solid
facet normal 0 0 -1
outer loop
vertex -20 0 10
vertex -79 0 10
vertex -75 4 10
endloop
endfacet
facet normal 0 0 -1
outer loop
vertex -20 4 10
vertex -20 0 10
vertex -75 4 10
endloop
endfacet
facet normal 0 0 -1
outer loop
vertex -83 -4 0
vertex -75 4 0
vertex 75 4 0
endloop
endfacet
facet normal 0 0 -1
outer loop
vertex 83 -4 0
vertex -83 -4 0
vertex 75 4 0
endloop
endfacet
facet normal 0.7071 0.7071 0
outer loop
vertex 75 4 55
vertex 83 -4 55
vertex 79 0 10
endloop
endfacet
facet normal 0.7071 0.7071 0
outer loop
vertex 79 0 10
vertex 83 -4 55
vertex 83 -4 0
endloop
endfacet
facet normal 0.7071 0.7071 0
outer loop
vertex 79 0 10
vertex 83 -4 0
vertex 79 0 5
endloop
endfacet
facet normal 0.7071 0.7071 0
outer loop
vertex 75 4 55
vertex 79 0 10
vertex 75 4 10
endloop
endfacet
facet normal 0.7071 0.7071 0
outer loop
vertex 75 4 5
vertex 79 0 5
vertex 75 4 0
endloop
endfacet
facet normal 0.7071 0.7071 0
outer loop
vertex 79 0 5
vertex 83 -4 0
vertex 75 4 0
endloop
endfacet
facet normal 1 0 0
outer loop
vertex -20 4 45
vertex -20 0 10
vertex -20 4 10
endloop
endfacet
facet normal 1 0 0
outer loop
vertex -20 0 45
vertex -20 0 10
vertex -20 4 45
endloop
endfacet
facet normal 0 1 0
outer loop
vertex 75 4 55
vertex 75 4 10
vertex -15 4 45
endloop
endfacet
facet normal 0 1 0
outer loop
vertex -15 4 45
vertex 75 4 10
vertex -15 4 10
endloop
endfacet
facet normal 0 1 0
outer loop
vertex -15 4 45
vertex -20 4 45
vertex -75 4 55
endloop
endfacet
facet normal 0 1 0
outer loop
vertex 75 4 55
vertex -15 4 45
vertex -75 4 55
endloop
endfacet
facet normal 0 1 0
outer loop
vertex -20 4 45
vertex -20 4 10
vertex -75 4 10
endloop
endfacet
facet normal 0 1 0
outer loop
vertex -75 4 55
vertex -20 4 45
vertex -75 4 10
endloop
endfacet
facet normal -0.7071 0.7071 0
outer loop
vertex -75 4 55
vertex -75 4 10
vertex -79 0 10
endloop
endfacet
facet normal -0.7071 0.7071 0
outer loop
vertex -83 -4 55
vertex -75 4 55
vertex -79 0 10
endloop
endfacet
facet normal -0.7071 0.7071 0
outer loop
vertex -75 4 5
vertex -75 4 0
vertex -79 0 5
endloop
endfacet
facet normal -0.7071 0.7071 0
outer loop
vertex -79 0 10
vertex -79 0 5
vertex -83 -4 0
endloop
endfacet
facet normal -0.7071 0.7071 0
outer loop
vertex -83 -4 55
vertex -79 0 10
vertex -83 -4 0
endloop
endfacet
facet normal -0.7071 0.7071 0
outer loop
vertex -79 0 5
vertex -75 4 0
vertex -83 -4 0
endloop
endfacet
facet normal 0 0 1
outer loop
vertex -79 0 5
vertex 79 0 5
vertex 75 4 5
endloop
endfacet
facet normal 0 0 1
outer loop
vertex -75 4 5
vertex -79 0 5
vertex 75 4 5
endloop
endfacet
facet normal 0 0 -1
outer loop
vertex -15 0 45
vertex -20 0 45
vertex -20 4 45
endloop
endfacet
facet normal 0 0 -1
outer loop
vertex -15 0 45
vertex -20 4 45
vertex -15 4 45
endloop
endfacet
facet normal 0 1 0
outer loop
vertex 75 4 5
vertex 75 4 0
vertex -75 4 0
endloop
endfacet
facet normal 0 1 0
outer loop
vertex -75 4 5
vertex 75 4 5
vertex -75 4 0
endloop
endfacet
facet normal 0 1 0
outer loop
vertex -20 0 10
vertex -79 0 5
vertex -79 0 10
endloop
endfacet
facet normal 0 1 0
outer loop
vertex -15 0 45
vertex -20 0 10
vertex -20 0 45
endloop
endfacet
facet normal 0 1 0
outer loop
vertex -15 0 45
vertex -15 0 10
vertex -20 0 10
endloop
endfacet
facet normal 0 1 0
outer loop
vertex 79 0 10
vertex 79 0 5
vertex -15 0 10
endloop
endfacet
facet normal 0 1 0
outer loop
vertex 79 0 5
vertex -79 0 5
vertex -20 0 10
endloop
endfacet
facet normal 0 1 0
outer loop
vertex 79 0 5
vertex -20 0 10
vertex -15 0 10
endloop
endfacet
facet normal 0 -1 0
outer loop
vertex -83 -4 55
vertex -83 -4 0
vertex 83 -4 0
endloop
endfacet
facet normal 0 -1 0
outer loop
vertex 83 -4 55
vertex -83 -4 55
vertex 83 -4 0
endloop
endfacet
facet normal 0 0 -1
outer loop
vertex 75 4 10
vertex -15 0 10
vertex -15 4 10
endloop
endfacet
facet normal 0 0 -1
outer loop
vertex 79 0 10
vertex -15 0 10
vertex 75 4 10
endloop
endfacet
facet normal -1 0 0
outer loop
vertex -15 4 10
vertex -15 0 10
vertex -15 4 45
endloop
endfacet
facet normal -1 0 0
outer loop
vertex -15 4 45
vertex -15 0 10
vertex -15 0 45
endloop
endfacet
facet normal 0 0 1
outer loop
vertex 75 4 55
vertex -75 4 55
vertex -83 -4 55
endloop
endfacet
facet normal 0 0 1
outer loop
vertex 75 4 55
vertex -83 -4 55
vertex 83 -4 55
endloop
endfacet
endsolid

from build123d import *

# Parameters (mm, degrees)
F1_DEPTH = 55
F2_W     = 4
F2_H     = 5
F3_DEPTH = 83
F4_W     = 5
F4_H     = 35
F5_DEPTH = 4


with BuildPart() as f1:
    # F0 (on Top) → F1 (new body)
    with BuildSketch(Plane.XY):
        Polygon((-75, 4), (-83, -4), (83, -4), (75, 4), align=None)
    extrude(amount=F1_DEPTH)

    # F2 (on Right) → F3 (cut, symmetric)
    with BuildSketch(Plane.YZ):
        with Locations((2, 7.5)):
            Rectangle(F2_W, F2_H)
    extrude(amount=F3_DEPTH, both=True, mode=Mode.SUBTRACT)

    # F4 (on Front) → F5 (cut)
    with BuildSketch(Plane.XZ):
        with Locations((-17.5, 27.5)):
            Rectangle(F4_W, F4_H)
    extrude(amount=-F5_DEPTH, mode=Mode.SUBTRACT)


solid = f1.part
